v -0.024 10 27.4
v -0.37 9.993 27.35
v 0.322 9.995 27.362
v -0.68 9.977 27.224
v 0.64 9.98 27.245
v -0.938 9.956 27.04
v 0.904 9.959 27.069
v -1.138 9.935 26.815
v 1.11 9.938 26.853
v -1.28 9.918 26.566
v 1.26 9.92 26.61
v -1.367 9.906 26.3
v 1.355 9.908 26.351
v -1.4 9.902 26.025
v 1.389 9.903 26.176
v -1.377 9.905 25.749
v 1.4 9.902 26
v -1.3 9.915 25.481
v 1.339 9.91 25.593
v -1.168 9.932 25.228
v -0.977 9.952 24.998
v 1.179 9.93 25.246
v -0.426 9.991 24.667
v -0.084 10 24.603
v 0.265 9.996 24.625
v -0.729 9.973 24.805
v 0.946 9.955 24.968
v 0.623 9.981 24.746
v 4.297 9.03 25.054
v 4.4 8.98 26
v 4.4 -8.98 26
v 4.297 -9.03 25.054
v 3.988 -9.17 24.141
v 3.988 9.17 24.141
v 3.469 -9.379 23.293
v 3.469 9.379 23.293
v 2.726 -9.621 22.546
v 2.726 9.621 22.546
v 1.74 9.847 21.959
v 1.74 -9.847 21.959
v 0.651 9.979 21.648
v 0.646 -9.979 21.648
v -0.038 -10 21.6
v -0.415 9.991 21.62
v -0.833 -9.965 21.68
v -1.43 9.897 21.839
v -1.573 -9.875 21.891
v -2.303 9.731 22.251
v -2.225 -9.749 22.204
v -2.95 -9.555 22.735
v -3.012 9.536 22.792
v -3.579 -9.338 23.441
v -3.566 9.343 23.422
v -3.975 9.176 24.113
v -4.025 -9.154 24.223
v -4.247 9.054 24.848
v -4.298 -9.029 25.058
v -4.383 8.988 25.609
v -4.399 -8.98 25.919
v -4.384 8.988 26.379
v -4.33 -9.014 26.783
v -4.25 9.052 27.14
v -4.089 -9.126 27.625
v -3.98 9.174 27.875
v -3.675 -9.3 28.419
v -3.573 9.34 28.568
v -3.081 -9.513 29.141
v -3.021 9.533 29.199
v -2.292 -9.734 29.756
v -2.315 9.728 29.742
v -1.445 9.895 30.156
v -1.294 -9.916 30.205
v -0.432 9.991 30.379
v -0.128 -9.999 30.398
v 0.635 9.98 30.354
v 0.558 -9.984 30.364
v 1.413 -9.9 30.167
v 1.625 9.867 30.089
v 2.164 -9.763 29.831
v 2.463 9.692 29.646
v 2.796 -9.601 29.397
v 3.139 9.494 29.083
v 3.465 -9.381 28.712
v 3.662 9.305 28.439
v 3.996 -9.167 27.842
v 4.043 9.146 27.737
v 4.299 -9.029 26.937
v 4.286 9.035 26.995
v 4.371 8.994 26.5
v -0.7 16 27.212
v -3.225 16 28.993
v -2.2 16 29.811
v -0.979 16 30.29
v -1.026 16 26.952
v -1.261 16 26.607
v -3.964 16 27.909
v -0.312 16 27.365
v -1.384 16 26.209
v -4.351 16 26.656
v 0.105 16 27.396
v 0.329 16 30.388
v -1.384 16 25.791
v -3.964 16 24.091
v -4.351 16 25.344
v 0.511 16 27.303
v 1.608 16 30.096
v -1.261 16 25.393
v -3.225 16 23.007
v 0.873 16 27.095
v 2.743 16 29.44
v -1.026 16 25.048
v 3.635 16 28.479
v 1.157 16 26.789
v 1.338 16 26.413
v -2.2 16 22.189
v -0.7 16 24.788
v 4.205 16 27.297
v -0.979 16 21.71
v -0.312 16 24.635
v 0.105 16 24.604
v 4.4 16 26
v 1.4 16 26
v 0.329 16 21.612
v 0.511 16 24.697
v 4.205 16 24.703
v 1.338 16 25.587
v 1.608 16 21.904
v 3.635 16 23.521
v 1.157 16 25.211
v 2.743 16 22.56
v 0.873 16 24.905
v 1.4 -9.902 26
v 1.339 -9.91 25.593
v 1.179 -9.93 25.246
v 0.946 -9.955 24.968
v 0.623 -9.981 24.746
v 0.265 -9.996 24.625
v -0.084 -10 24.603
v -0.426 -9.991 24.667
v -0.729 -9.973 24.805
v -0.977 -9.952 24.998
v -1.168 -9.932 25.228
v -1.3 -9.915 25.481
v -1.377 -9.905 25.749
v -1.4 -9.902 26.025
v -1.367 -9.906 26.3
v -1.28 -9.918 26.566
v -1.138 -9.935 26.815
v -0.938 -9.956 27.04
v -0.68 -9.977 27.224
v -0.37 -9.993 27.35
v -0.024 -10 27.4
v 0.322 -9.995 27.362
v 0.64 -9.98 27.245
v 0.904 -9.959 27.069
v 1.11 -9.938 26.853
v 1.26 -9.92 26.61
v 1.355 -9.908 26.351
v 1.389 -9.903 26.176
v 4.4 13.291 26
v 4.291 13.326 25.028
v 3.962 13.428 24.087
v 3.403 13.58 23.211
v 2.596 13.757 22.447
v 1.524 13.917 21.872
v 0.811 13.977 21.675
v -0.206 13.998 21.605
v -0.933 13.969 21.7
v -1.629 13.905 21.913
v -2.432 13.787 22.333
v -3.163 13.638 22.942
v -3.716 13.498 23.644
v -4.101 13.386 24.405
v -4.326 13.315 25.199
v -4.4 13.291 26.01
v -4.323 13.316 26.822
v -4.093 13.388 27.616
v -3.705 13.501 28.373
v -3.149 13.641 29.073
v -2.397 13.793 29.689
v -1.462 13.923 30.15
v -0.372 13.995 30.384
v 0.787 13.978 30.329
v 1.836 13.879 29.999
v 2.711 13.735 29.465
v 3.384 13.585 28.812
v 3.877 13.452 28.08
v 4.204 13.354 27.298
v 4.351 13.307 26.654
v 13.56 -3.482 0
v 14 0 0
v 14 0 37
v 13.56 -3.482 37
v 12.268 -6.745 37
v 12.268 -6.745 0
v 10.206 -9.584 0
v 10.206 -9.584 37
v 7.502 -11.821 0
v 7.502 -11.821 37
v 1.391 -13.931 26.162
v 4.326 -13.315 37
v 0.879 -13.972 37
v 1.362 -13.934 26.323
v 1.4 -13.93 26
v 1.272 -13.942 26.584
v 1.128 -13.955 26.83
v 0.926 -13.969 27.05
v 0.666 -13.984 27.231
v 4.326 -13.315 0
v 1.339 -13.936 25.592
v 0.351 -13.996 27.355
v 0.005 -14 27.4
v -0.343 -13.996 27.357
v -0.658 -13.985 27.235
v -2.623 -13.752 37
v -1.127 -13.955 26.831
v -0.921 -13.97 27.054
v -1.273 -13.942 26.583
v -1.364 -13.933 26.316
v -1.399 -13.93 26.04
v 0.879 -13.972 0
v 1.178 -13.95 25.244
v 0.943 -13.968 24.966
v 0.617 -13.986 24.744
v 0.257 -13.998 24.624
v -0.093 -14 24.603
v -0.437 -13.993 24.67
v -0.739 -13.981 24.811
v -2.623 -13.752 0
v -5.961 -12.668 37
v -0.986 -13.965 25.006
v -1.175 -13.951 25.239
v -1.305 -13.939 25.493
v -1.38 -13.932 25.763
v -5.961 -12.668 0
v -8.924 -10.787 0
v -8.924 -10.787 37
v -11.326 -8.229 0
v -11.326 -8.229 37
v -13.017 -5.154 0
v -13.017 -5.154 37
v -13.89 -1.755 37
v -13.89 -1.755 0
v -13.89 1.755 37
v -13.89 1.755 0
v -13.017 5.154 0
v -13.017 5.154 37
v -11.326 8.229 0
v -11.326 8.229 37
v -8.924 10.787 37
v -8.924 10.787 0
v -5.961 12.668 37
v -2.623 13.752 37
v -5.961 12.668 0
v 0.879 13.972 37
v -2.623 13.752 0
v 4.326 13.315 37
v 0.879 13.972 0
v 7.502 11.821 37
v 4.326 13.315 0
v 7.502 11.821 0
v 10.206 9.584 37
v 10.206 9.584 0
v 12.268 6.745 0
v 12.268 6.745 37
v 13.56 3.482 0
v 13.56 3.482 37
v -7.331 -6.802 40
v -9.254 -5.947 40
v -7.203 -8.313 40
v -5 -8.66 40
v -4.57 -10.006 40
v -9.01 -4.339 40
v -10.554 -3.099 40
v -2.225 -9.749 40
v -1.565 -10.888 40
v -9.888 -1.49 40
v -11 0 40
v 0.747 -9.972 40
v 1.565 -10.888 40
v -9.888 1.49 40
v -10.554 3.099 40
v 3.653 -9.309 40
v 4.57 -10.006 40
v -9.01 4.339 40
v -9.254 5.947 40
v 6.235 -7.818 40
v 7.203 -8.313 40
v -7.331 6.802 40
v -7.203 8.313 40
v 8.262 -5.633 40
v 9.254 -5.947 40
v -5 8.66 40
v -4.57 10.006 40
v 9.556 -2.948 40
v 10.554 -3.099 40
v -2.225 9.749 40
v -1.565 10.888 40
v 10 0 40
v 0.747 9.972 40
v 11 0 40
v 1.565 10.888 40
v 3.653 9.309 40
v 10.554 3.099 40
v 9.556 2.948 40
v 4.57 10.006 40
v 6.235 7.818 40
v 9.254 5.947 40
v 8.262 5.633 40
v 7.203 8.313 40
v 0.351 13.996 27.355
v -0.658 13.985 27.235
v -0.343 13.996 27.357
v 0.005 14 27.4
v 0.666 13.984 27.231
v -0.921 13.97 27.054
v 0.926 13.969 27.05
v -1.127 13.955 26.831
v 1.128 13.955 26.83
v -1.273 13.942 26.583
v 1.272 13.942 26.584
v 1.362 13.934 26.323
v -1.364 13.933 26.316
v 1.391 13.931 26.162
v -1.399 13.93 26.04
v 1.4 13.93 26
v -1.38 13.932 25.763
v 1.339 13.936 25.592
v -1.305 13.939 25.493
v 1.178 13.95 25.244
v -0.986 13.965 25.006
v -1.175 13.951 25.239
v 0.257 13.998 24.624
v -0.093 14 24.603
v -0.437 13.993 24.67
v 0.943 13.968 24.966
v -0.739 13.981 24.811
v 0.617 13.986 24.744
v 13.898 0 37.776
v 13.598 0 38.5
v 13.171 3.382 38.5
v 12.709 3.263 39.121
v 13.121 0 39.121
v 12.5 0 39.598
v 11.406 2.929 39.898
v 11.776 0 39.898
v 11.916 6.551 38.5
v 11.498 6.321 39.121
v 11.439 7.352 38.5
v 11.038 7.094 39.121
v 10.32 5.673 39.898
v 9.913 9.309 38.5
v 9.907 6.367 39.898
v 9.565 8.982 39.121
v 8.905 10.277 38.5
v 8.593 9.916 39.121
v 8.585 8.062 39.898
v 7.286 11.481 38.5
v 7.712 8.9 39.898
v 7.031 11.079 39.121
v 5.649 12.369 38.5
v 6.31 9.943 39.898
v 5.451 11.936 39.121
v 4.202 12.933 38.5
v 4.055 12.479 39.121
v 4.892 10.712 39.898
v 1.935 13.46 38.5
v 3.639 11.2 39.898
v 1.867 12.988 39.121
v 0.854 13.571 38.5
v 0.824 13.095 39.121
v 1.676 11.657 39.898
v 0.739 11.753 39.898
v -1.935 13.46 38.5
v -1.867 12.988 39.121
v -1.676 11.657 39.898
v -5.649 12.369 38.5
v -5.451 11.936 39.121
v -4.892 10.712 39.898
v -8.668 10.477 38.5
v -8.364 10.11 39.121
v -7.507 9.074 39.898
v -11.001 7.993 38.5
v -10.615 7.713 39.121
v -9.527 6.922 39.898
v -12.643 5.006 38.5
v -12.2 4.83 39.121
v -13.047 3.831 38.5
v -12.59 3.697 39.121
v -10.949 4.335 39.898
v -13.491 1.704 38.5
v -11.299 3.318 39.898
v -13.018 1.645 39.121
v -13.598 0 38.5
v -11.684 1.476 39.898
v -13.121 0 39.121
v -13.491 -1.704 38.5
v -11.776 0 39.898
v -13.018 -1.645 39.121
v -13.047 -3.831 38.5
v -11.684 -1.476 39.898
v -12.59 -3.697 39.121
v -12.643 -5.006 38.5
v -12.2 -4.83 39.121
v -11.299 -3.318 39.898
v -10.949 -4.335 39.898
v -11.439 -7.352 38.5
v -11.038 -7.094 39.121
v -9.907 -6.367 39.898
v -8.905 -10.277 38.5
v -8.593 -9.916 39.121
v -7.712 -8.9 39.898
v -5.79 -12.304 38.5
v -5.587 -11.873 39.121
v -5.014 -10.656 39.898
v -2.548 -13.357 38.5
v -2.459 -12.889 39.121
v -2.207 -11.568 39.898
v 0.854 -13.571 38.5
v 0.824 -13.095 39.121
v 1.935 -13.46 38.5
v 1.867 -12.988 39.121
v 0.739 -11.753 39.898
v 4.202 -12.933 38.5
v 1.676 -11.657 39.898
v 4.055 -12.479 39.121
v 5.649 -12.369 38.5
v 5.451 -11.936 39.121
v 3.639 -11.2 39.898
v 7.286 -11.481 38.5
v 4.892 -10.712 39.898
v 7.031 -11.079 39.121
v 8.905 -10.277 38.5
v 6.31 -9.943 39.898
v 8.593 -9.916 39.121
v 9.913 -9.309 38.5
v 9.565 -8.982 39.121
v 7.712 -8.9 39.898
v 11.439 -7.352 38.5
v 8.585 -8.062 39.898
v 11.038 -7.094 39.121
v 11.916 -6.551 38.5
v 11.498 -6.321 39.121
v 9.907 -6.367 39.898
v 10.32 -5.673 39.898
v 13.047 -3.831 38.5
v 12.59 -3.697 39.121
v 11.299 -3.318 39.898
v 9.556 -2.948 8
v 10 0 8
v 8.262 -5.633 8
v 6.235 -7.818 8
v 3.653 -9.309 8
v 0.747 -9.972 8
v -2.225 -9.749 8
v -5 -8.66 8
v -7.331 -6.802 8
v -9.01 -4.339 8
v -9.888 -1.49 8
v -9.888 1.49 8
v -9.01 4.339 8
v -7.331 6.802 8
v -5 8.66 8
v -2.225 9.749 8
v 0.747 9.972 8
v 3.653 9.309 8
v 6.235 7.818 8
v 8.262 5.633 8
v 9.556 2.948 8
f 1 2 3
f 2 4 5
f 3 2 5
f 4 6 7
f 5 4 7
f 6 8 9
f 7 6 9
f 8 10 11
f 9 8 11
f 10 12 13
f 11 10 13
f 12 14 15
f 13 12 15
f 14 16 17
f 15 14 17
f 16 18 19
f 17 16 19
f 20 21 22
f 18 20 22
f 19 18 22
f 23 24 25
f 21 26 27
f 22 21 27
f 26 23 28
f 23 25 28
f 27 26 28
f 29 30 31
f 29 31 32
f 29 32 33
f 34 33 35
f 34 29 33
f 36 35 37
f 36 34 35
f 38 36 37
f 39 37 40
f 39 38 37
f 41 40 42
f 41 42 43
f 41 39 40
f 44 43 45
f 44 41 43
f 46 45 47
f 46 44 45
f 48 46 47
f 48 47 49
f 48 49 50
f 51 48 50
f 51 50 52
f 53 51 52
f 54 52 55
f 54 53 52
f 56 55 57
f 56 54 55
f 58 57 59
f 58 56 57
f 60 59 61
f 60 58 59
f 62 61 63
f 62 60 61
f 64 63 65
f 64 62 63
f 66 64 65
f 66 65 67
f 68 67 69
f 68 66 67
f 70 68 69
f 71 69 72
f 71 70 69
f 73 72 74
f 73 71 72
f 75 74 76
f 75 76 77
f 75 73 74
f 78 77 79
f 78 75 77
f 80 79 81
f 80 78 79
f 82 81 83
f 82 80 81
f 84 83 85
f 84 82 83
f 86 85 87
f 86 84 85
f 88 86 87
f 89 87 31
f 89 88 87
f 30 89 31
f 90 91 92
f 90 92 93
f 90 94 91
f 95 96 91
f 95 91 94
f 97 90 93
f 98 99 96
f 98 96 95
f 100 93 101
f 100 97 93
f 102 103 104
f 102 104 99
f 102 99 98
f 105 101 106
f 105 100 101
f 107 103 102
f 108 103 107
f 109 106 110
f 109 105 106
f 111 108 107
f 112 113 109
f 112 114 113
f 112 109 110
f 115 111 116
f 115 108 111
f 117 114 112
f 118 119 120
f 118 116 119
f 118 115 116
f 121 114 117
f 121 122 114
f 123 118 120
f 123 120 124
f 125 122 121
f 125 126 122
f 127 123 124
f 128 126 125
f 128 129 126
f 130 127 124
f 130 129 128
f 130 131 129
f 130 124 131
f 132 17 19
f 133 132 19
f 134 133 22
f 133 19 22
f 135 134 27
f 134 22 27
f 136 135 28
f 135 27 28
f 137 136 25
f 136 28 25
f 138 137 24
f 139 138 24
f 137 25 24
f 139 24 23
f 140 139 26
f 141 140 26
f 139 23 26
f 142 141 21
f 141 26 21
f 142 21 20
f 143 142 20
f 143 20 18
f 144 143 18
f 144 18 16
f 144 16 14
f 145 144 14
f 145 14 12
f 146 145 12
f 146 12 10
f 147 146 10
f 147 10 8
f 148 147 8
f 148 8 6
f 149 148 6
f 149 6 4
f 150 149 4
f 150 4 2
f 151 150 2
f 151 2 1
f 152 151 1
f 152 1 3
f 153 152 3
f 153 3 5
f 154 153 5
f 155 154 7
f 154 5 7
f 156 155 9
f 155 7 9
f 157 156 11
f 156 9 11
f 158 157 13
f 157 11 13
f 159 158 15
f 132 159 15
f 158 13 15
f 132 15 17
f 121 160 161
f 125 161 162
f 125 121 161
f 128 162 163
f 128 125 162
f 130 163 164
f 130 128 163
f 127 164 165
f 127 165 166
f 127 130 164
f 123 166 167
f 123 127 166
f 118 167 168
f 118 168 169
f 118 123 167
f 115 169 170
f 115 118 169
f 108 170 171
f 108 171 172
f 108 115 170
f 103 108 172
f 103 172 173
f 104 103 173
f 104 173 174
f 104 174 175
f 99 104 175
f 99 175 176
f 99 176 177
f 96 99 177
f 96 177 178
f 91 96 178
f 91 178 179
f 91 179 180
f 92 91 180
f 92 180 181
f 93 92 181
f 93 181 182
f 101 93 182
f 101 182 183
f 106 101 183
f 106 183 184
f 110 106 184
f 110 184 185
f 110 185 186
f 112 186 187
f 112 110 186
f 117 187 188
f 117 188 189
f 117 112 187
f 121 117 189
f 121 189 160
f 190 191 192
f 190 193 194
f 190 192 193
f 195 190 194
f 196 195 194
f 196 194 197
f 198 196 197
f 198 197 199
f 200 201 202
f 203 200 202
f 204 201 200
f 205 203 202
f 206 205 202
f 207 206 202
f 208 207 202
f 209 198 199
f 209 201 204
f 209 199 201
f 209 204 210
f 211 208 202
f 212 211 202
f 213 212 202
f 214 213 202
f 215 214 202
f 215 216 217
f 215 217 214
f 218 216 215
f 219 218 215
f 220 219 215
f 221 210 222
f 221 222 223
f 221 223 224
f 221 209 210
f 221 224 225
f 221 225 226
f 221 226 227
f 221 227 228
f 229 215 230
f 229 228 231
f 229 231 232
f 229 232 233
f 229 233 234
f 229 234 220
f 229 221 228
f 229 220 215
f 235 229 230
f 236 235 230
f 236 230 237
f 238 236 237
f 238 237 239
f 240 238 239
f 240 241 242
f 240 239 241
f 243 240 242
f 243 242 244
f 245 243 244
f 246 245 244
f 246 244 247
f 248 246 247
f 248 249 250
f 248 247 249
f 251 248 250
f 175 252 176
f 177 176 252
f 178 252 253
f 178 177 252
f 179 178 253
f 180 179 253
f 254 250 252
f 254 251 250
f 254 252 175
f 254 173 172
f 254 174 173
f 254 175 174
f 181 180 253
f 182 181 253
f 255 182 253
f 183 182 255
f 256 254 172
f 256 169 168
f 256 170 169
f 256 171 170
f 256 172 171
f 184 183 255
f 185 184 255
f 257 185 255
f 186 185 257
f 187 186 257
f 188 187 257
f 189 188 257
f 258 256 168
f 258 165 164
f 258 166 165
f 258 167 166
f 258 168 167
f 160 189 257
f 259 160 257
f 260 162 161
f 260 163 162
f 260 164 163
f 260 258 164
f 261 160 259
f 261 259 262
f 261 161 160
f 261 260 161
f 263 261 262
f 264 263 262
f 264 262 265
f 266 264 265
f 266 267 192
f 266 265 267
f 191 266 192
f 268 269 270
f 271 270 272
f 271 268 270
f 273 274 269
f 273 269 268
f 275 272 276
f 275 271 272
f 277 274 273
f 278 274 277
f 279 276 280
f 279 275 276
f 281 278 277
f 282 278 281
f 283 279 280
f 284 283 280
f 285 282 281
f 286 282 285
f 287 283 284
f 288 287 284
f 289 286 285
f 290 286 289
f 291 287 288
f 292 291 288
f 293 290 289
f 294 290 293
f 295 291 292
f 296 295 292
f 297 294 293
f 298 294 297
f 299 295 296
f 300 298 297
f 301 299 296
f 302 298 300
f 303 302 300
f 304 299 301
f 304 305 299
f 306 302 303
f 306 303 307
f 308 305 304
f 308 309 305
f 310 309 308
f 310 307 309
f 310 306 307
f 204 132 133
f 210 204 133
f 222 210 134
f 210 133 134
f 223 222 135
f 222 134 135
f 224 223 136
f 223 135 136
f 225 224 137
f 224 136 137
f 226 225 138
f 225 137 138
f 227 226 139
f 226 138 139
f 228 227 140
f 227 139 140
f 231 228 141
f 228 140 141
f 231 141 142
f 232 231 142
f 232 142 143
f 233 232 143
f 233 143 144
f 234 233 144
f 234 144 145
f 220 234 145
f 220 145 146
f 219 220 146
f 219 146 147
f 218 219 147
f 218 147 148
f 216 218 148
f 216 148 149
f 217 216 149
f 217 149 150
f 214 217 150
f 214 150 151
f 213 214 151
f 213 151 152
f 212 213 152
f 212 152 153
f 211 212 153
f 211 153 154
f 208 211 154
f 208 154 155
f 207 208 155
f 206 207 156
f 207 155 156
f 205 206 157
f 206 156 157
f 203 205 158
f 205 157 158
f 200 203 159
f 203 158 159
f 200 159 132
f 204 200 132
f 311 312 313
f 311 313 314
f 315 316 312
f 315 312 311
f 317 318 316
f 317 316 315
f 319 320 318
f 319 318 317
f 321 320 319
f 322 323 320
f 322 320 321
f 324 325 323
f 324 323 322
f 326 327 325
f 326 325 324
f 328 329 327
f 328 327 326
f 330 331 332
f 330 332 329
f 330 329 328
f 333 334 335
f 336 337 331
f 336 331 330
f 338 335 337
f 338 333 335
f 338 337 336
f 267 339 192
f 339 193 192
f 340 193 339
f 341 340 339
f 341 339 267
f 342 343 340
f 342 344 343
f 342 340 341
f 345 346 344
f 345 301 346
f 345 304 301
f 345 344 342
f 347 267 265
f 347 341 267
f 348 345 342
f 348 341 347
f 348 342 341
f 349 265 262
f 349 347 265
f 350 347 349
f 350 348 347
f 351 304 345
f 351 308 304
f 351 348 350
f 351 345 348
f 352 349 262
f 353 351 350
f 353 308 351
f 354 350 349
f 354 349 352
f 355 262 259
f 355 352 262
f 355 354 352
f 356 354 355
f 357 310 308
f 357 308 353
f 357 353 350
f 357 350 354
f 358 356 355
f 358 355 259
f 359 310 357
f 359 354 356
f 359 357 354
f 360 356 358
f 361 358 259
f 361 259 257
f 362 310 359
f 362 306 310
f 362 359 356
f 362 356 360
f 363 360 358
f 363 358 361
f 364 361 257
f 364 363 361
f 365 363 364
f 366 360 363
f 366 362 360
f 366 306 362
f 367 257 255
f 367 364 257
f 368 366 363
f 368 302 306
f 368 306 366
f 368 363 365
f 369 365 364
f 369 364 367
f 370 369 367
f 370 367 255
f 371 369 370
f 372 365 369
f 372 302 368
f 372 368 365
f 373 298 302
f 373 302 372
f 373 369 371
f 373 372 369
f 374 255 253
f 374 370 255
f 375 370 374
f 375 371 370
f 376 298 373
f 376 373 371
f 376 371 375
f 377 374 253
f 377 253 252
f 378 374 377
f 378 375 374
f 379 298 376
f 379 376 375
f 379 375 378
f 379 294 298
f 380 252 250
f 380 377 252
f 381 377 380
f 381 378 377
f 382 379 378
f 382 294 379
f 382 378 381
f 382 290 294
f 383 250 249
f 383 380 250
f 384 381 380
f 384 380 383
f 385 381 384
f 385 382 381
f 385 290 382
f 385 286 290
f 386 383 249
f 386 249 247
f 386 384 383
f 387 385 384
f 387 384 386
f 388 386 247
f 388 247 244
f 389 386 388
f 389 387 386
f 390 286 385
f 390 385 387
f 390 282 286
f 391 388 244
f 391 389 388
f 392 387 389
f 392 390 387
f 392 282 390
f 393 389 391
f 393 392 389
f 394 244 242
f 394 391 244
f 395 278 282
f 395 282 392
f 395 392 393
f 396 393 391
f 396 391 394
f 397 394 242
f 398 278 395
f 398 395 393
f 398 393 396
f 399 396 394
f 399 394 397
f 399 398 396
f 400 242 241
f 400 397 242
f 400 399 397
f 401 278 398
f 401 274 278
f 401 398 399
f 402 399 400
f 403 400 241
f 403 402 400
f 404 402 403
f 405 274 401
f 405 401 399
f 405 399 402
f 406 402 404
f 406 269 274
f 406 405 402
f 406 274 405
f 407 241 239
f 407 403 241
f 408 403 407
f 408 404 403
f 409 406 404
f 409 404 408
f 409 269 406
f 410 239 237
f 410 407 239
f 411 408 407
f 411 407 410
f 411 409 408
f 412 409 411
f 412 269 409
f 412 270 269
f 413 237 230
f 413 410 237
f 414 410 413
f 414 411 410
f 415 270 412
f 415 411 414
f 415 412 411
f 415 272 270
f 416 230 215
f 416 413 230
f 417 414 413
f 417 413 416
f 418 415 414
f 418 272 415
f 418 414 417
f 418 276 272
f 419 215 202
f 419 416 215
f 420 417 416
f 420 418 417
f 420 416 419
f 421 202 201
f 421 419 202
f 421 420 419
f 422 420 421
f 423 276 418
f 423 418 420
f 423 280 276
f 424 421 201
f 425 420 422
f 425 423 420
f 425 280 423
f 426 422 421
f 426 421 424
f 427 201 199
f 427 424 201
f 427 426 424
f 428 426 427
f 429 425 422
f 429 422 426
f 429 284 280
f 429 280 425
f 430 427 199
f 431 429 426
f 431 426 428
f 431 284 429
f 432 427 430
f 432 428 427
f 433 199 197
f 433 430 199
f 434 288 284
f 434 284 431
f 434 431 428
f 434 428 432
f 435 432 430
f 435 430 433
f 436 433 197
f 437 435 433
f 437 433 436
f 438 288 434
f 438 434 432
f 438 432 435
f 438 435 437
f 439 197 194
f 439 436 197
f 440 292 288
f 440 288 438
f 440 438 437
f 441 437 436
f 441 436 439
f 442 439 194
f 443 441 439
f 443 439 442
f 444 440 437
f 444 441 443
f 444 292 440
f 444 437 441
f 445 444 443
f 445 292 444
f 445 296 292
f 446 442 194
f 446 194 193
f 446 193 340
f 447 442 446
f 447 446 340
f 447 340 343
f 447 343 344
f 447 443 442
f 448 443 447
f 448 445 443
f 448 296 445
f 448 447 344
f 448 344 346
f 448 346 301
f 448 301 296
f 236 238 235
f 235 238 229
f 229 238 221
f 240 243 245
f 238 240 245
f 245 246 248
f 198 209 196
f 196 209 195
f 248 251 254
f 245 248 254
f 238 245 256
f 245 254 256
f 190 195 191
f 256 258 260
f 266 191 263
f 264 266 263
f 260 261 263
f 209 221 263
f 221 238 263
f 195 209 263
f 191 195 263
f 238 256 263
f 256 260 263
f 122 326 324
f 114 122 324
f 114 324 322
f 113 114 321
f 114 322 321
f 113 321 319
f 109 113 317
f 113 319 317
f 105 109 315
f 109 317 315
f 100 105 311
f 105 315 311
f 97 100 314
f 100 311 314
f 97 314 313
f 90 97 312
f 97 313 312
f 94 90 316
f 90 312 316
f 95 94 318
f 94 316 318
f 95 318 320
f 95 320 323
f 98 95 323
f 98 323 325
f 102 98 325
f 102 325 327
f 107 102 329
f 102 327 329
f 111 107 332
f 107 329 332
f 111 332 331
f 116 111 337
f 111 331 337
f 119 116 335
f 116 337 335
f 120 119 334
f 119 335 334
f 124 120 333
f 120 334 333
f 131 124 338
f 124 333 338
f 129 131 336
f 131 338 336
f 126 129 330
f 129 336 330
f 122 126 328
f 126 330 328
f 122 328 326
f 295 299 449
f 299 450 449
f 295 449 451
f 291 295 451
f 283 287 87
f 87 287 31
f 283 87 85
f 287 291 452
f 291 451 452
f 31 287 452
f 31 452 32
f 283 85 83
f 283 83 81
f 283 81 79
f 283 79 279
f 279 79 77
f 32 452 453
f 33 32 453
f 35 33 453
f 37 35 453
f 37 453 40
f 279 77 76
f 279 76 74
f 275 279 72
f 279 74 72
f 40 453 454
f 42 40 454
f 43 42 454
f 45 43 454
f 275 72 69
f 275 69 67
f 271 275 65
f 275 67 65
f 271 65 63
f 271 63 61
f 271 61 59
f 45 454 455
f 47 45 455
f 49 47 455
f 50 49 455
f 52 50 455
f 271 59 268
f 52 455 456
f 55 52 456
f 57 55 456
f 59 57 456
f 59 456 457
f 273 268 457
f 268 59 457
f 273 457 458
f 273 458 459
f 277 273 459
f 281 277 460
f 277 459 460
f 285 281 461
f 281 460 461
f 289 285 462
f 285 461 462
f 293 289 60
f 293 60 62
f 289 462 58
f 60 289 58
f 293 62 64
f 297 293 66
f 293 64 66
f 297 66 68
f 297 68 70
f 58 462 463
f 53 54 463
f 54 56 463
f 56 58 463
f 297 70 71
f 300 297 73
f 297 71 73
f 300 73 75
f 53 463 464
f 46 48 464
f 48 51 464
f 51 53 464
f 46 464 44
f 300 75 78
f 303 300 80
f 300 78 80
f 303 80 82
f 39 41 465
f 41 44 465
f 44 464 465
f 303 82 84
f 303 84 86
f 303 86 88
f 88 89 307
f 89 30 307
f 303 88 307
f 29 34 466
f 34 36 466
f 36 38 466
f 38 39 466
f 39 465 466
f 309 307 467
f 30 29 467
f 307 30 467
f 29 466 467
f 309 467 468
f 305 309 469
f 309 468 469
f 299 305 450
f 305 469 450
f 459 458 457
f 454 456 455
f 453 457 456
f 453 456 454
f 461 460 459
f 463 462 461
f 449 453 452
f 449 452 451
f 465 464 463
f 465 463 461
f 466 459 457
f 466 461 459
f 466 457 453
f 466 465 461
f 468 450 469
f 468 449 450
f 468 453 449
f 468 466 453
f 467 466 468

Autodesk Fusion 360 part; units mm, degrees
sketch "Sketch1" plane through (0, 0, 0) normal (0, 0, 1) x (1, 0, 0)
  circle A0 centre (0, 0) radius 10
  circle A1 centre (0, 0) radius 14
  dimension "d1" = 20
  dimension "d2" = 28
extrude "Extrude3" add sketch "Sketch1" along normal blind 7 contours A0 | A1 makes body 1
extrude "Extrude2" add sketch "Sketch1" along normal blind 8 separate body contours A0 makes body 2
extrude "Extrude1" add sketch "Sketch1" along normal blind 40 separate body makes body 3
fillet "Fillet1" radius 3 1 edges at (-13.0526, -5.0626, 40) on bodies 3
combine "Combine1" operation add target body 3 tool bodies 1 2
sketch "Sketch2" plane through (0, 0, 0) normal (0, 1, 0) x (1, 0, 0)
  circle A0 centre (0, -26) radius 1.4
  circle A1 centre (0, -26) radius 4.4
  dimension "d10" = 2.8
  dimension "d11" = 3
extrude "Extrude5" cut sketch "Sketch2" along normal up to surface contours A0 end surface at (13.9304, -1.3939, 12.3333) on bodies 3 bodies 3
extrude "Extrude4" add sketch "Sketch2" along normal up to surface and the other way blind -16 end surface at (-2.9183, -9.5647, 24.6793) on bodies 3 bodies 3
